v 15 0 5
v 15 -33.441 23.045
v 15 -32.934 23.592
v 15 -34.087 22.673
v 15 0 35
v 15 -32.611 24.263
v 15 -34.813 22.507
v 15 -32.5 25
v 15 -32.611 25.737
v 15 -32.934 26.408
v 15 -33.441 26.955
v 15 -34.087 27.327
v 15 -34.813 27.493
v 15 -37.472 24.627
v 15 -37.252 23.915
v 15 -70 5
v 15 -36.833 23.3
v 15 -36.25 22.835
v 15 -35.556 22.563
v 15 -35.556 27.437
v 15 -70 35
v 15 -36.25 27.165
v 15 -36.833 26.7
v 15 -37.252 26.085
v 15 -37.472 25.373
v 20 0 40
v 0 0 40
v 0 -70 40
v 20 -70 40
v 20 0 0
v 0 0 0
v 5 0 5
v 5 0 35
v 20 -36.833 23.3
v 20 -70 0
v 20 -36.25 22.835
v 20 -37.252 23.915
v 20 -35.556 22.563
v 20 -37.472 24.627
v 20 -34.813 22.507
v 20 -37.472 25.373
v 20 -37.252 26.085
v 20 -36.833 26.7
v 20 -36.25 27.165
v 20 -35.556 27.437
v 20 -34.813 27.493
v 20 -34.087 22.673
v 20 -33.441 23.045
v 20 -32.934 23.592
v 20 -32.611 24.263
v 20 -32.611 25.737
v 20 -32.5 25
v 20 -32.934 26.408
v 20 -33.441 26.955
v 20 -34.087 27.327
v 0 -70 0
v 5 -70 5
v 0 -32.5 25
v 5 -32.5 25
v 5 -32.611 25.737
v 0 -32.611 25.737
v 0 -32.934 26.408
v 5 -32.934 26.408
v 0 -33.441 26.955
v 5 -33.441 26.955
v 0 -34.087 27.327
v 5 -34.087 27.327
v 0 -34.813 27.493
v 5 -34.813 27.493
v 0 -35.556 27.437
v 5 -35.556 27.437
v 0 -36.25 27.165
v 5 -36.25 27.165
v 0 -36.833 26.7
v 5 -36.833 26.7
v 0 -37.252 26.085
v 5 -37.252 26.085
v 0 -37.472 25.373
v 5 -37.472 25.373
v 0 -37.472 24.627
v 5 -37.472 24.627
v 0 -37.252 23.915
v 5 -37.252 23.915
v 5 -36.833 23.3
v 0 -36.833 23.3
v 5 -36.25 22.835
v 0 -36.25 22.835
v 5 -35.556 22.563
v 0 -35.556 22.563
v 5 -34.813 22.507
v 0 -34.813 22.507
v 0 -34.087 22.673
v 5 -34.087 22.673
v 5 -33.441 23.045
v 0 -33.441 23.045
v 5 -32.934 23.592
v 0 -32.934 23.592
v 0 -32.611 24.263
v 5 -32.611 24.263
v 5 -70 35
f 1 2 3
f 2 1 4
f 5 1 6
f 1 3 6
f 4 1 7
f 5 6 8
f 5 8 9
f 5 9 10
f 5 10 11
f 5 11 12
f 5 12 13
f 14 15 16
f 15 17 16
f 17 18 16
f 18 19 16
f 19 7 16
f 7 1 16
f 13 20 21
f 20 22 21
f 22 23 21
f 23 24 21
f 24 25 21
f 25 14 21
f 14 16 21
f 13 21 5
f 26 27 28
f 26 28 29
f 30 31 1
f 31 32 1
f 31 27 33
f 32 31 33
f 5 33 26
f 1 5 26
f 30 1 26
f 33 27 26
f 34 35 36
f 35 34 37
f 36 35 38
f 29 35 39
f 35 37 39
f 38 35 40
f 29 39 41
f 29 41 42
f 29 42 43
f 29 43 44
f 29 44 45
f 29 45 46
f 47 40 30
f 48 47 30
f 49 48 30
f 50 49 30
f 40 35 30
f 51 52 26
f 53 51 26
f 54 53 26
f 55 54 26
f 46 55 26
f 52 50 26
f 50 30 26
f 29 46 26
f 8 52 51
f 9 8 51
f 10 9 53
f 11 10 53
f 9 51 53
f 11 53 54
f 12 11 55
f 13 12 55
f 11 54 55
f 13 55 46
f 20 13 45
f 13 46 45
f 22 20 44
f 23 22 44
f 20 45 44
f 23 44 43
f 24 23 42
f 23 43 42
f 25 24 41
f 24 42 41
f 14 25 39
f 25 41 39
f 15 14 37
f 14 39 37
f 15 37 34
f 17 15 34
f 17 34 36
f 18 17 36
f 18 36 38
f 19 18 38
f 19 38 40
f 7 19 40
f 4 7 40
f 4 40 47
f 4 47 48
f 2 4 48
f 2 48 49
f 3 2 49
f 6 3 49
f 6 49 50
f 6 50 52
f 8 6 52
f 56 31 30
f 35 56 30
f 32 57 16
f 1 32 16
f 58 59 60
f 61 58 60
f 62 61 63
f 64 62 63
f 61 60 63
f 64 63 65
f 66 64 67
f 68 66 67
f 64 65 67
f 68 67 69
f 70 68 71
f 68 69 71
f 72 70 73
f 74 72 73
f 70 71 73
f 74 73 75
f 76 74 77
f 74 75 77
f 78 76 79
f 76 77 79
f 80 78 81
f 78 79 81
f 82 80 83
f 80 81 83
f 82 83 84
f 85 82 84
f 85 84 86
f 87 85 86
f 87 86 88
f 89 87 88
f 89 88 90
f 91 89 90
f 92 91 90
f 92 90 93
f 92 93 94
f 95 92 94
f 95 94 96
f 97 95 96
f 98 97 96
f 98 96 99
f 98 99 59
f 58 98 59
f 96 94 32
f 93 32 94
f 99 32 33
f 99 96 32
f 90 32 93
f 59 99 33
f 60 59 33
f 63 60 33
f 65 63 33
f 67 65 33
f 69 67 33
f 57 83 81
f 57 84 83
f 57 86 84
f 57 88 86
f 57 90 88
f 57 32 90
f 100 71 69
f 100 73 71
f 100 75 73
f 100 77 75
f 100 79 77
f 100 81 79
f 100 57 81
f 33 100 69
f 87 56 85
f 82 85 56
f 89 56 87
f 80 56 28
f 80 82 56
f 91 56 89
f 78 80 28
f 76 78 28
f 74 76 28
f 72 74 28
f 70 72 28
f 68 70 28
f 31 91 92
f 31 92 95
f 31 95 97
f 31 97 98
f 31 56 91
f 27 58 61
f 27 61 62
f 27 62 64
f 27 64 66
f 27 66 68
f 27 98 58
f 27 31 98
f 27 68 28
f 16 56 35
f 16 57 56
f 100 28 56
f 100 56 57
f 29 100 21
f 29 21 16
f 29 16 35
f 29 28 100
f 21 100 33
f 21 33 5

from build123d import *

# Parameters (mm, degrees)
F0_W     = 20
F0_H     = 40
F1_DEPTH = 70
F2_R     = 2.5
F3_DEPTH = 20.001
F4_W     = 10
F4_H     = 30
F5_DEPTH = 70.001


with BuildPart() as f1:
    # F0 (on Front) → F1 (new body)
    with BuildSketch(Plane.XZ):
        with Locations((10, 20)):
            Rectangle(F0_W, F0_H)
    extrude(amount=F1_DEPTH)

    # F2 (on face) → F3 (cut, through all)
    with BuildSketch(Plane.YZ.offset(20)):
        with Locations((-35, 25)):
            Circle(F2_R)
    extrude(amount=-F3_DEPTH, mode=Mode.SUBTRACT)

    # F4 (on face) → F5 (cut, through all)
    with BuildSketch(Plane.XZ.offset(70)):
        with Locations((10, 20)):
            Rectangle(F4_W, F4_H)
    extrude(amount=-F5_DEPTH, mode=Mode.SUBTRACT)


solid = f1.part
